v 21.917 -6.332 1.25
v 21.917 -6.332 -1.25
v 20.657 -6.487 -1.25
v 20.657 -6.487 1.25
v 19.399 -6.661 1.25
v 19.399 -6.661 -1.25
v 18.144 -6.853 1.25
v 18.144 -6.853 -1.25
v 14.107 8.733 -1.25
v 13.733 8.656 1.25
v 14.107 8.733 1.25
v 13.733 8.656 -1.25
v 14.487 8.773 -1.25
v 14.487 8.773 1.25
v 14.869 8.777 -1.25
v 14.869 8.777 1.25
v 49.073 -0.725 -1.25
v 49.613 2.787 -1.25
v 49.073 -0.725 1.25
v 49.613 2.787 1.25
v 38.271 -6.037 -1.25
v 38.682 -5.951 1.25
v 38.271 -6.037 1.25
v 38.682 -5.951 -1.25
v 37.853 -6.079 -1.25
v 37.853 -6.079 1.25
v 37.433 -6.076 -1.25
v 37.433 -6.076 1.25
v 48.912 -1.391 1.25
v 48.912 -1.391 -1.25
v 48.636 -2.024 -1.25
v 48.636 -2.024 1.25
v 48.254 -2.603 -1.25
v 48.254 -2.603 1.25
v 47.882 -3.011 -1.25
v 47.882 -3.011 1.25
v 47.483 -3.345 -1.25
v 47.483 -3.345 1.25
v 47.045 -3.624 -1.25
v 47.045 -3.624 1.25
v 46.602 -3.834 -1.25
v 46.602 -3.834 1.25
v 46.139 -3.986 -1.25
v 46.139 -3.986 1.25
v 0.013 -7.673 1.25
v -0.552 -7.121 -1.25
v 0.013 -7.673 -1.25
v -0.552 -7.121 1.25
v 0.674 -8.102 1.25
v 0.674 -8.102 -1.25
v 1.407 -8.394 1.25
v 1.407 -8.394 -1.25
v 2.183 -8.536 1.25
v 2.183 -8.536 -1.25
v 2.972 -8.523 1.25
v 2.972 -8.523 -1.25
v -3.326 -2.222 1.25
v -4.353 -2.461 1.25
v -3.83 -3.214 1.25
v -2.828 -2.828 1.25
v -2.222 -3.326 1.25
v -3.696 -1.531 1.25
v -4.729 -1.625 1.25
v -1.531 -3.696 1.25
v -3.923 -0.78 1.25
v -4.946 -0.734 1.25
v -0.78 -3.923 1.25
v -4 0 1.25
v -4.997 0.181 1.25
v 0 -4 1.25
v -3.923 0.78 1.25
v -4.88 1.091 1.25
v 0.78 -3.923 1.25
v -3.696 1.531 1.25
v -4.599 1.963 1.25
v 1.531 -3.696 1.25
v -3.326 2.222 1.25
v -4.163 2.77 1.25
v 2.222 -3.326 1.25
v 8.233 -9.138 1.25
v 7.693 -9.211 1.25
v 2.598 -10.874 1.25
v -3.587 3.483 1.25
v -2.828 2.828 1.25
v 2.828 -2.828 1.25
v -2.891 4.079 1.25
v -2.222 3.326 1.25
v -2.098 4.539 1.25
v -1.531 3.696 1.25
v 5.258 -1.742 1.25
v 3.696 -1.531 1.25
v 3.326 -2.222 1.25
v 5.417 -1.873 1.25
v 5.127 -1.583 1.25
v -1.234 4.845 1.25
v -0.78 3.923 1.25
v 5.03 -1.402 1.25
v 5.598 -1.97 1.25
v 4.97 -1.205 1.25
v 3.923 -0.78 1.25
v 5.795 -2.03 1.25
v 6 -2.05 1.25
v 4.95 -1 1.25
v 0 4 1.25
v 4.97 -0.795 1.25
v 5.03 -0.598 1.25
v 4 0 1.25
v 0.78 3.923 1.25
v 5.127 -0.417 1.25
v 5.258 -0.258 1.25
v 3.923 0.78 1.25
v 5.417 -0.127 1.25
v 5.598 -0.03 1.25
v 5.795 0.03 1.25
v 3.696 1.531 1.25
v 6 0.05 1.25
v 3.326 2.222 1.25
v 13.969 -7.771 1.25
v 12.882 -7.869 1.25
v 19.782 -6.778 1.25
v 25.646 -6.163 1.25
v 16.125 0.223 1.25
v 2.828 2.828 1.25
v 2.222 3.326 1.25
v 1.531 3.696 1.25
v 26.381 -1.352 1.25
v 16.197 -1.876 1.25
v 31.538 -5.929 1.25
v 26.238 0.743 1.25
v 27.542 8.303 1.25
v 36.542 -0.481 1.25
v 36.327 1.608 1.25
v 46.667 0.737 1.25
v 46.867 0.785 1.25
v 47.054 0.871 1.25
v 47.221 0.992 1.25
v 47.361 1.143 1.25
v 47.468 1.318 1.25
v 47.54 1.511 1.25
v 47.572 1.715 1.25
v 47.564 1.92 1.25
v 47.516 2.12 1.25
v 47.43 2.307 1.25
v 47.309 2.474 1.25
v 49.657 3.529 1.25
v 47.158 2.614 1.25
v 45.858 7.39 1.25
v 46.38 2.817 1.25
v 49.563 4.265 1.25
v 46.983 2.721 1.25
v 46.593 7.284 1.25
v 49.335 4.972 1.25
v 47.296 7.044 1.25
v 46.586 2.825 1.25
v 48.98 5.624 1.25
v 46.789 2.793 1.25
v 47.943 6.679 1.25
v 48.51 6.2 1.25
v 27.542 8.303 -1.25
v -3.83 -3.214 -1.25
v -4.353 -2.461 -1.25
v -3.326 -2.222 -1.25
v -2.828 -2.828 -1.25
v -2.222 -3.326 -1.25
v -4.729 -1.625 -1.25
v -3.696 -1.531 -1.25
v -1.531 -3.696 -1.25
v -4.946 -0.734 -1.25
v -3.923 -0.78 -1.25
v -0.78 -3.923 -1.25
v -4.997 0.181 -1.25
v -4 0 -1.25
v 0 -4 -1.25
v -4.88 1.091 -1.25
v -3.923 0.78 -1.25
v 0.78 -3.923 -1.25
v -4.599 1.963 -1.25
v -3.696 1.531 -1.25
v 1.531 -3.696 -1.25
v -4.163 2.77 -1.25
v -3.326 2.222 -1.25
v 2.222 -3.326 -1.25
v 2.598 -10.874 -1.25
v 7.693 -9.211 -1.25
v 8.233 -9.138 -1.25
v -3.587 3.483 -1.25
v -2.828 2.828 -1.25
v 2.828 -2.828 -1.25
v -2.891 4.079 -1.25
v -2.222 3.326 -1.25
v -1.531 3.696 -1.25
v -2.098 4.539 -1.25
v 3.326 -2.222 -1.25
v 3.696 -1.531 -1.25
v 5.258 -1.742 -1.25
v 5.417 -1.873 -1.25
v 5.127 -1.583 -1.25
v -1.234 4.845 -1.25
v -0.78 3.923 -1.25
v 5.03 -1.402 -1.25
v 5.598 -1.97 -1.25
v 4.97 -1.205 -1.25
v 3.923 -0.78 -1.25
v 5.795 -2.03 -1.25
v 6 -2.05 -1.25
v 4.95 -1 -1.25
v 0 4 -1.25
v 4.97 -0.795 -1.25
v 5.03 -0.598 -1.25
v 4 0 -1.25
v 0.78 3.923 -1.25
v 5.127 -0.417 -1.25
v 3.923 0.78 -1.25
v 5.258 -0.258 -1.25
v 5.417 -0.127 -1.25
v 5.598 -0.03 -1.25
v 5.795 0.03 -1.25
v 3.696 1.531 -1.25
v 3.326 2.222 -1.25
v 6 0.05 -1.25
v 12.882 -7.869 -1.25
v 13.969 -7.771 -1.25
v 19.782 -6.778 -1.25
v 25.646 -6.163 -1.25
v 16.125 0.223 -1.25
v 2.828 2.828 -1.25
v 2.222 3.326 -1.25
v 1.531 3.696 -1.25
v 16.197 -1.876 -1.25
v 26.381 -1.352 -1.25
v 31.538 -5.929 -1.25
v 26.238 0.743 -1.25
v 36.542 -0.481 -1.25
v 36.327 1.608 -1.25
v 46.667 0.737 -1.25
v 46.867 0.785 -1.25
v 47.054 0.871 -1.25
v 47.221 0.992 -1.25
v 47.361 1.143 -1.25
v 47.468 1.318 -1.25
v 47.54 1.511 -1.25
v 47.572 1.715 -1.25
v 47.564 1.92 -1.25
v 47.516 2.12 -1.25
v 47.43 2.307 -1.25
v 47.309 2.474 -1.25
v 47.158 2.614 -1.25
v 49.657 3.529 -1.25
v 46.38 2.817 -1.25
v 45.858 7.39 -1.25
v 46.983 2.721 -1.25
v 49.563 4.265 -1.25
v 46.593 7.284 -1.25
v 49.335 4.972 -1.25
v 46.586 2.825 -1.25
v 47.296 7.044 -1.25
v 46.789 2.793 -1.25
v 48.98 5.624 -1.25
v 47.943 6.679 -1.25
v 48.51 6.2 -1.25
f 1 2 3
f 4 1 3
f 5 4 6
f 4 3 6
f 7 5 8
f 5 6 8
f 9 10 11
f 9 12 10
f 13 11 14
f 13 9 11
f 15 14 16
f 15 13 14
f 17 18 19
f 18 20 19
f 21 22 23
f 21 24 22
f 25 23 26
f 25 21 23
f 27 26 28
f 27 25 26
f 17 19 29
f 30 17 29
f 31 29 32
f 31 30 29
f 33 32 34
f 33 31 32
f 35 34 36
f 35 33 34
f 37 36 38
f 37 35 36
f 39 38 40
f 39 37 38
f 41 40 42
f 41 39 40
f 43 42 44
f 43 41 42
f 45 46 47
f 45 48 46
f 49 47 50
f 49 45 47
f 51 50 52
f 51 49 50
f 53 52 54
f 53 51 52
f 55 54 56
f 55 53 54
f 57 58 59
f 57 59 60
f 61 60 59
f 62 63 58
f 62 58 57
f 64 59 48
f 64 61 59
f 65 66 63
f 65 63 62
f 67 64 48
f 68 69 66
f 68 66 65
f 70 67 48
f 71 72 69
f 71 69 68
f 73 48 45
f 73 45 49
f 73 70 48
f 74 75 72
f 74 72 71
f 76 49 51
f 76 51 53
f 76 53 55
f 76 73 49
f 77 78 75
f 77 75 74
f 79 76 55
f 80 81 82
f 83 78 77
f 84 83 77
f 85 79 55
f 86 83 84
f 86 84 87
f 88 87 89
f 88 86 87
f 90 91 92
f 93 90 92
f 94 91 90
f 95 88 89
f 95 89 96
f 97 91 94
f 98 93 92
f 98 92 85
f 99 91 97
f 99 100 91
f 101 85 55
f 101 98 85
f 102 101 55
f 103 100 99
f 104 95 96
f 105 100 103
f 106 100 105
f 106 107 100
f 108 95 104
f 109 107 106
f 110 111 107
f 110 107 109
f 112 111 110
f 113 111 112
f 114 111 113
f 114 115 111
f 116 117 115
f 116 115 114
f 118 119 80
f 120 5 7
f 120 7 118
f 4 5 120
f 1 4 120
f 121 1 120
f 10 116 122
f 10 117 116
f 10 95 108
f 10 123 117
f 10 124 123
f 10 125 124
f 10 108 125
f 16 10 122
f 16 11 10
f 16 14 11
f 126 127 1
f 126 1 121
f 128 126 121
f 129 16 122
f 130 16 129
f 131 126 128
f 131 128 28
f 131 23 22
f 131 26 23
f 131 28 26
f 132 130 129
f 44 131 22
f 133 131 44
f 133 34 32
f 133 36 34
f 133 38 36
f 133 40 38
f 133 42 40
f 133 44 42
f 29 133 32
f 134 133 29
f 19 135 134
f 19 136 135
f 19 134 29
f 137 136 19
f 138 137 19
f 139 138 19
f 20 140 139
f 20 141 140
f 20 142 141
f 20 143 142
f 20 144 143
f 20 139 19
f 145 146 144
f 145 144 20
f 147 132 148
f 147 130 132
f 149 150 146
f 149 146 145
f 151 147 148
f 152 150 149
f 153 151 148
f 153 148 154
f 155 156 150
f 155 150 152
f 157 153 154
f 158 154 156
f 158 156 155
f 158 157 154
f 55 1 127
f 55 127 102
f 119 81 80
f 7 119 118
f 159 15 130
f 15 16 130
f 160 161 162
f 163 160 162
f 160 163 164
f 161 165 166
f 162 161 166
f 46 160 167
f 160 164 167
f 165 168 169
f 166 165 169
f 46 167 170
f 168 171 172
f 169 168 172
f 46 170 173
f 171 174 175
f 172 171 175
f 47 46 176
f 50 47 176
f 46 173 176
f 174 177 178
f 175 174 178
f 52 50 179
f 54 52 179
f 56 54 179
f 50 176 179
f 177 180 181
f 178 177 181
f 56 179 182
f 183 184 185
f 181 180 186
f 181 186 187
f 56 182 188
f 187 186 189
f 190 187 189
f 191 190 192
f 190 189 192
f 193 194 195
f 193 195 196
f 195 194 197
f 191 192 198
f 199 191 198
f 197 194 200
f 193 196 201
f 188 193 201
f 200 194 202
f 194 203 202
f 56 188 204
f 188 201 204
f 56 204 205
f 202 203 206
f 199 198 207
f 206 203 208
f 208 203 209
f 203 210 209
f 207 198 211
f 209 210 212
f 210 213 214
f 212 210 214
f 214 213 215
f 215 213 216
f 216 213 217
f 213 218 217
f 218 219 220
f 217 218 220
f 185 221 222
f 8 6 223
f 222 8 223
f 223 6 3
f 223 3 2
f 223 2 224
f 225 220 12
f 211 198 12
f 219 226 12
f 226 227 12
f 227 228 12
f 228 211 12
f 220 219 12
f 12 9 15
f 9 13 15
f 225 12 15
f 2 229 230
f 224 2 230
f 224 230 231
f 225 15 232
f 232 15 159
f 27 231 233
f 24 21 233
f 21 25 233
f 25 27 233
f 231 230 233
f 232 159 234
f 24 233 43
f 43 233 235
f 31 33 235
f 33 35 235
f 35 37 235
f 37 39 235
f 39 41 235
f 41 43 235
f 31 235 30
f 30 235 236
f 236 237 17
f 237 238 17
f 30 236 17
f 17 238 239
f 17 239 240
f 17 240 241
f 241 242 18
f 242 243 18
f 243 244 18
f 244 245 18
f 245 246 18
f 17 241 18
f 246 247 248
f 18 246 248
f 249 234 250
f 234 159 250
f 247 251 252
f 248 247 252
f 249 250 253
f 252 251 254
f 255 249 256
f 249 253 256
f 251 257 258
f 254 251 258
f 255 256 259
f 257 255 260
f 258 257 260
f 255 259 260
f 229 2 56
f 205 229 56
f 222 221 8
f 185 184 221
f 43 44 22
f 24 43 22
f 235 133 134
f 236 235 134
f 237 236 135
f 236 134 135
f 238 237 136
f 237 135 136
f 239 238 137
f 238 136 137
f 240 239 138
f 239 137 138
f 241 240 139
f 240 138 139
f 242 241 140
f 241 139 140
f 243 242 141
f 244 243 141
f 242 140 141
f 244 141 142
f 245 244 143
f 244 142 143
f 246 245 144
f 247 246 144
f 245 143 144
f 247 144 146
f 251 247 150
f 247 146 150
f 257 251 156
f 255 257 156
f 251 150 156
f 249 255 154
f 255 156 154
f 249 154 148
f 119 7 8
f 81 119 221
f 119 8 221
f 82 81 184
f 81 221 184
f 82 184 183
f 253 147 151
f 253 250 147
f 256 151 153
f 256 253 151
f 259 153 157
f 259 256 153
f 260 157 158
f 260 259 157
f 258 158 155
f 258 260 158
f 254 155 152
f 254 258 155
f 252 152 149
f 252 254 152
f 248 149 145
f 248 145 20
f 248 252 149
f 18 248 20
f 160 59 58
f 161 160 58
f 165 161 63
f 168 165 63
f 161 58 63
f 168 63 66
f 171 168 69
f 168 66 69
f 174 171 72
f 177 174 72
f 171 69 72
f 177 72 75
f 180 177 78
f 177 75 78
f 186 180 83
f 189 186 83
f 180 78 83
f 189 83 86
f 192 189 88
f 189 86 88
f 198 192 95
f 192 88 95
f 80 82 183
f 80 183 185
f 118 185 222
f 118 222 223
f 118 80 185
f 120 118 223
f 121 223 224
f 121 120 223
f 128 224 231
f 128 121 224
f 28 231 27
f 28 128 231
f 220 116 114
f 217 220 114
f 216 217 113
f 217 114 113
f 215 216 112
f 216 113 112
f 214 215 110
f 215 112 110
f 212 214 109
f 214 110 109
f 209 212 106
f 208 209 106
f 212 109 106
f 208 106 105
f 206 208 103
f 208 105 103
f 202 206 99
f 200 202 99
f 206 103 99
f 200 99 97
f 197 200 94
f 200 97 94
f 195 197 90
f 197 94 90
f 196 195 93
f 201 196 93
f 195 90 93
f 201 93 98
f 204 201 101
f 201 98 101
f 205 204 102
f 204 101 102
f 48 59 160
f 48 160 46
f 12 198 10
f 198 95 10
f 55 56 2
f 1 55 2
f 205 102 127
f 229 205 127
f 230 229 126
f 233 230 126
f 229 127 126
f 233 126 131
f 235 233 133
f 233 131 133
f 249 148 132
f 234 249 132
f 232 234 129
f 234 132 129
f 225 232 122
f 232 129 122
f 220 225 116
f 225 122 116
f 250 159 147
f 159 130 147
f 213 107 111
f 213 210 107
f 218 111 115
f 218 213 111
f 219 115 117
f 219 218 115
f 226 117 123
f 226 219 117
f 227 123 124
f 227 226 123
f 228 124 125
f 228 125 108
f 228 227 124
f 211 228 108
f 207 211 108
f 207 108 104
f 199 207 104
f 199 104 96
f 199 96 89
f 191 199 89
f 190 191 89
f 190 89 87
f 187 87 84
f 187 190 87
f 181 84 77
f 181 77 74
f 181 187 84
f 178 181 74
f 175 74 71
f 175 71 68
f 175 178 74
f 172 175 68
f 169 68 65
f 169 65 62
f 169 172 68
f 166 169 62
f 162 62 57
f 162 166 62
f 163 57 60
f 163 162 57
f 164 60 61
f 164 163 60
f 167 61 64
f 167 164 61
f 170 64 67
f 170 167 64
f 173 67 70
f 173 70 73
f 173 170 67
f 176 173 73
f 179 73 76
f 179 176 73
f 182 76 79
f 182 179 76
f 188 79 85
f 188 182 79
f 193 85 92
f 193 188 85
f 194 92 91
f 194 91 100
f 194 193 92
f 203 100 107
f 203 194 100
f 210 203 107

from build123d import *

# Parameters (mm, degrees)
SKETCH_1_R          = 4
EXTRUDE_1_DEPTH     = 1.25
CUT_EXTRUDE_1_DEPTH = 22
EXTRUDE_START       = -2.5
EXTRUDE_2_DEPTH     = 2.5
CUT_EXTRUDE_START   = -2.5
CUT_EXTRUDE_2_DEPTH = 2.5
CUT_EXTRUDE_4_DEPTH = 10
FILLET_1_R          = 4


with BuildPart() as part:
    # 草图1 → 凸台-拉伸1 (new, symmetric)
    with BuildSketch(Plane.XY):
        with BuildLine():
            Line((-1.233702436, 4.84540796), (14.292269552, 8.798517714))
            Line((14.292269552, 8.798517714), (27.541816671, 8.302545362))
            Line((27.541816671, 8.302545362), (50.285691672, 7.168894271))
            Line((50.285691672, 7.168894271), (48.971743891, -1.387225717))
            Line((48.971743891, -1.387225717), (38.114277377, -2.724152564))
            Line((38.114277377, -2.724152564), (18.384478153, -4.790312237))
            Line((18.384478153, -4.790312237), (3.124153733, -7.364758207))
            Line((3.124153733, -7.364758207), (-2.372822781, -4.401103504))
            ThreePointArc((-2.372822781, -4.401103504), (-4.962484216, 0.611351292), (-1.233702436, 4.84540796))
        make_face()
        Circle(SKETCH_1_R, mode=Mode.SUBTRACT)
    extrude(amount=EXTRUDE_1_DEPTH, both=True)

    # 草图2 → 切除-拉伸1 (cut)
    with BuildSketch(Plane.XY.offset(1.25)):
        with BuildLine():
            ThreePointArc((6, -2.05), (26.381158068, -1.352479883), (46.666940766, 0.736816365))
            ThreePointArc((46.666940766, 0.736816365), (47.563889378, 1.920236488), (46.380469254, 2.8171851))
            ThreePointArc((46.380469254, 2.8171851), (26.237586384, 0.742606553), (6, 0.05))
            ThreePointArc((6, 0.05), (4.95, -1), (6, -2.05))
        make_face()
    extrude(amount=-CUT_EXTRUDE_1_DEPTH, mode=Mode.SUBTRACT)

    # 草图3 → 凸台-拉伸2 (add)
    with BuildSketch(Plane(origin=(0, 0, -1.25), x_dir=(-1, 0, 0), z_dir=(0, 0, -1)).offset(EXTRUDE_START)):
        with BuildLine():
            Line((3.830222216, -3.213938048), (-2.597653881, -10.87438248))
            ThreePointArc((-2.597653881, -10.87438248), (-25.103045153, -6.203517484), (-48.061011216, -7.317703438))
            Line((-48.061011216, -7.317703438), (-48.971743891, -1.387225717))
            Line((-48.971743891, -1.387225717), (-38.114277377, -2.724152564))
            Line((-38.114277377, -2.724152564), (-18.384478153, -4.790312237))
            Line((-18.384478153, -4.790312237), (-3.124153733, -7.364758207))
            Line((-3.124153733, -7.364758207), (2.372822781, -4.401103504))
            ThreePointArc((2.372822781, -4.401103504), (3.157812892, -3.876624529), (3.830222216, -3.213938048))
        make_face()
    extrude(amount=EXTRUDE_2_DEPTH)

    # 草图4 → 切除-拉伸2 (cut)
    with BuildSketch(Plane(origin=(0, 0, -1.25), x_dir=(-1, 0, 0), z_dir=(0, 0, -1)).offset(CUT_EXTRUDE_START)):
        with BuildLine():
            Line((-48.675283939, -3.317703438), (-38.061011216, -6.114773366))
            ThreePointArc((-38.061011216, -6.114773366), (-43.07765861, -6.577848026), (-48.061011216, -7.317703438))
            Line((-48.061011216, -7.317703438), (-48.675283939, -3.317703438))
        make_face()
    extrude(amount=CUT_EXTRUDE_2_DEPTH, mode=Mode.SUBTRACT)

    # 草图6 → 切除-拉伸4 (cut)
    with BuildSketch(Plane(origin=(0, 0, -1.25), x_dir=(-1, 0, 0), z_dir=(0, 0, -1))):
        with BuildLine():
            ThreePointArc((-21.916565225, -6.331777176), (-20.02762746, -6.571548728), (-18.144467787, -6.853126294))
            ThreePointArc((-18.144467787, -6.853126294), (-10.276894061, -8.499690713), (-2.597653881, -10.87438248))
            Line((-2.597653881, -10.87438248), (-0.832664521, -8.770950068))
            Line((-0.832664521, -8.770950068), (-21.916565225, -6.331777176))
        make_face()
    extrude(amount=-CUT_EXTRUDE_4_DEPTH, mode=Mode.SUBTRACT)

    # 圆角1
    fillet_1_edges = [part.edges().sort_by_distance(p)[0] for p in [
        (14.292269552, 8.798517714, 0),
        (27.541816671, 8.302545362, 0),
        (50.285691672, 7.168894271, 0),
        (48.675283939, -3.317703438, 0),
        (38.061011216, -6.114773366, 0),
        (0.832664521, -8.770950068, 0),
    ]]
    fillet(fillet_1_edges, radius=FILLET_1_R)


solid = part.part
